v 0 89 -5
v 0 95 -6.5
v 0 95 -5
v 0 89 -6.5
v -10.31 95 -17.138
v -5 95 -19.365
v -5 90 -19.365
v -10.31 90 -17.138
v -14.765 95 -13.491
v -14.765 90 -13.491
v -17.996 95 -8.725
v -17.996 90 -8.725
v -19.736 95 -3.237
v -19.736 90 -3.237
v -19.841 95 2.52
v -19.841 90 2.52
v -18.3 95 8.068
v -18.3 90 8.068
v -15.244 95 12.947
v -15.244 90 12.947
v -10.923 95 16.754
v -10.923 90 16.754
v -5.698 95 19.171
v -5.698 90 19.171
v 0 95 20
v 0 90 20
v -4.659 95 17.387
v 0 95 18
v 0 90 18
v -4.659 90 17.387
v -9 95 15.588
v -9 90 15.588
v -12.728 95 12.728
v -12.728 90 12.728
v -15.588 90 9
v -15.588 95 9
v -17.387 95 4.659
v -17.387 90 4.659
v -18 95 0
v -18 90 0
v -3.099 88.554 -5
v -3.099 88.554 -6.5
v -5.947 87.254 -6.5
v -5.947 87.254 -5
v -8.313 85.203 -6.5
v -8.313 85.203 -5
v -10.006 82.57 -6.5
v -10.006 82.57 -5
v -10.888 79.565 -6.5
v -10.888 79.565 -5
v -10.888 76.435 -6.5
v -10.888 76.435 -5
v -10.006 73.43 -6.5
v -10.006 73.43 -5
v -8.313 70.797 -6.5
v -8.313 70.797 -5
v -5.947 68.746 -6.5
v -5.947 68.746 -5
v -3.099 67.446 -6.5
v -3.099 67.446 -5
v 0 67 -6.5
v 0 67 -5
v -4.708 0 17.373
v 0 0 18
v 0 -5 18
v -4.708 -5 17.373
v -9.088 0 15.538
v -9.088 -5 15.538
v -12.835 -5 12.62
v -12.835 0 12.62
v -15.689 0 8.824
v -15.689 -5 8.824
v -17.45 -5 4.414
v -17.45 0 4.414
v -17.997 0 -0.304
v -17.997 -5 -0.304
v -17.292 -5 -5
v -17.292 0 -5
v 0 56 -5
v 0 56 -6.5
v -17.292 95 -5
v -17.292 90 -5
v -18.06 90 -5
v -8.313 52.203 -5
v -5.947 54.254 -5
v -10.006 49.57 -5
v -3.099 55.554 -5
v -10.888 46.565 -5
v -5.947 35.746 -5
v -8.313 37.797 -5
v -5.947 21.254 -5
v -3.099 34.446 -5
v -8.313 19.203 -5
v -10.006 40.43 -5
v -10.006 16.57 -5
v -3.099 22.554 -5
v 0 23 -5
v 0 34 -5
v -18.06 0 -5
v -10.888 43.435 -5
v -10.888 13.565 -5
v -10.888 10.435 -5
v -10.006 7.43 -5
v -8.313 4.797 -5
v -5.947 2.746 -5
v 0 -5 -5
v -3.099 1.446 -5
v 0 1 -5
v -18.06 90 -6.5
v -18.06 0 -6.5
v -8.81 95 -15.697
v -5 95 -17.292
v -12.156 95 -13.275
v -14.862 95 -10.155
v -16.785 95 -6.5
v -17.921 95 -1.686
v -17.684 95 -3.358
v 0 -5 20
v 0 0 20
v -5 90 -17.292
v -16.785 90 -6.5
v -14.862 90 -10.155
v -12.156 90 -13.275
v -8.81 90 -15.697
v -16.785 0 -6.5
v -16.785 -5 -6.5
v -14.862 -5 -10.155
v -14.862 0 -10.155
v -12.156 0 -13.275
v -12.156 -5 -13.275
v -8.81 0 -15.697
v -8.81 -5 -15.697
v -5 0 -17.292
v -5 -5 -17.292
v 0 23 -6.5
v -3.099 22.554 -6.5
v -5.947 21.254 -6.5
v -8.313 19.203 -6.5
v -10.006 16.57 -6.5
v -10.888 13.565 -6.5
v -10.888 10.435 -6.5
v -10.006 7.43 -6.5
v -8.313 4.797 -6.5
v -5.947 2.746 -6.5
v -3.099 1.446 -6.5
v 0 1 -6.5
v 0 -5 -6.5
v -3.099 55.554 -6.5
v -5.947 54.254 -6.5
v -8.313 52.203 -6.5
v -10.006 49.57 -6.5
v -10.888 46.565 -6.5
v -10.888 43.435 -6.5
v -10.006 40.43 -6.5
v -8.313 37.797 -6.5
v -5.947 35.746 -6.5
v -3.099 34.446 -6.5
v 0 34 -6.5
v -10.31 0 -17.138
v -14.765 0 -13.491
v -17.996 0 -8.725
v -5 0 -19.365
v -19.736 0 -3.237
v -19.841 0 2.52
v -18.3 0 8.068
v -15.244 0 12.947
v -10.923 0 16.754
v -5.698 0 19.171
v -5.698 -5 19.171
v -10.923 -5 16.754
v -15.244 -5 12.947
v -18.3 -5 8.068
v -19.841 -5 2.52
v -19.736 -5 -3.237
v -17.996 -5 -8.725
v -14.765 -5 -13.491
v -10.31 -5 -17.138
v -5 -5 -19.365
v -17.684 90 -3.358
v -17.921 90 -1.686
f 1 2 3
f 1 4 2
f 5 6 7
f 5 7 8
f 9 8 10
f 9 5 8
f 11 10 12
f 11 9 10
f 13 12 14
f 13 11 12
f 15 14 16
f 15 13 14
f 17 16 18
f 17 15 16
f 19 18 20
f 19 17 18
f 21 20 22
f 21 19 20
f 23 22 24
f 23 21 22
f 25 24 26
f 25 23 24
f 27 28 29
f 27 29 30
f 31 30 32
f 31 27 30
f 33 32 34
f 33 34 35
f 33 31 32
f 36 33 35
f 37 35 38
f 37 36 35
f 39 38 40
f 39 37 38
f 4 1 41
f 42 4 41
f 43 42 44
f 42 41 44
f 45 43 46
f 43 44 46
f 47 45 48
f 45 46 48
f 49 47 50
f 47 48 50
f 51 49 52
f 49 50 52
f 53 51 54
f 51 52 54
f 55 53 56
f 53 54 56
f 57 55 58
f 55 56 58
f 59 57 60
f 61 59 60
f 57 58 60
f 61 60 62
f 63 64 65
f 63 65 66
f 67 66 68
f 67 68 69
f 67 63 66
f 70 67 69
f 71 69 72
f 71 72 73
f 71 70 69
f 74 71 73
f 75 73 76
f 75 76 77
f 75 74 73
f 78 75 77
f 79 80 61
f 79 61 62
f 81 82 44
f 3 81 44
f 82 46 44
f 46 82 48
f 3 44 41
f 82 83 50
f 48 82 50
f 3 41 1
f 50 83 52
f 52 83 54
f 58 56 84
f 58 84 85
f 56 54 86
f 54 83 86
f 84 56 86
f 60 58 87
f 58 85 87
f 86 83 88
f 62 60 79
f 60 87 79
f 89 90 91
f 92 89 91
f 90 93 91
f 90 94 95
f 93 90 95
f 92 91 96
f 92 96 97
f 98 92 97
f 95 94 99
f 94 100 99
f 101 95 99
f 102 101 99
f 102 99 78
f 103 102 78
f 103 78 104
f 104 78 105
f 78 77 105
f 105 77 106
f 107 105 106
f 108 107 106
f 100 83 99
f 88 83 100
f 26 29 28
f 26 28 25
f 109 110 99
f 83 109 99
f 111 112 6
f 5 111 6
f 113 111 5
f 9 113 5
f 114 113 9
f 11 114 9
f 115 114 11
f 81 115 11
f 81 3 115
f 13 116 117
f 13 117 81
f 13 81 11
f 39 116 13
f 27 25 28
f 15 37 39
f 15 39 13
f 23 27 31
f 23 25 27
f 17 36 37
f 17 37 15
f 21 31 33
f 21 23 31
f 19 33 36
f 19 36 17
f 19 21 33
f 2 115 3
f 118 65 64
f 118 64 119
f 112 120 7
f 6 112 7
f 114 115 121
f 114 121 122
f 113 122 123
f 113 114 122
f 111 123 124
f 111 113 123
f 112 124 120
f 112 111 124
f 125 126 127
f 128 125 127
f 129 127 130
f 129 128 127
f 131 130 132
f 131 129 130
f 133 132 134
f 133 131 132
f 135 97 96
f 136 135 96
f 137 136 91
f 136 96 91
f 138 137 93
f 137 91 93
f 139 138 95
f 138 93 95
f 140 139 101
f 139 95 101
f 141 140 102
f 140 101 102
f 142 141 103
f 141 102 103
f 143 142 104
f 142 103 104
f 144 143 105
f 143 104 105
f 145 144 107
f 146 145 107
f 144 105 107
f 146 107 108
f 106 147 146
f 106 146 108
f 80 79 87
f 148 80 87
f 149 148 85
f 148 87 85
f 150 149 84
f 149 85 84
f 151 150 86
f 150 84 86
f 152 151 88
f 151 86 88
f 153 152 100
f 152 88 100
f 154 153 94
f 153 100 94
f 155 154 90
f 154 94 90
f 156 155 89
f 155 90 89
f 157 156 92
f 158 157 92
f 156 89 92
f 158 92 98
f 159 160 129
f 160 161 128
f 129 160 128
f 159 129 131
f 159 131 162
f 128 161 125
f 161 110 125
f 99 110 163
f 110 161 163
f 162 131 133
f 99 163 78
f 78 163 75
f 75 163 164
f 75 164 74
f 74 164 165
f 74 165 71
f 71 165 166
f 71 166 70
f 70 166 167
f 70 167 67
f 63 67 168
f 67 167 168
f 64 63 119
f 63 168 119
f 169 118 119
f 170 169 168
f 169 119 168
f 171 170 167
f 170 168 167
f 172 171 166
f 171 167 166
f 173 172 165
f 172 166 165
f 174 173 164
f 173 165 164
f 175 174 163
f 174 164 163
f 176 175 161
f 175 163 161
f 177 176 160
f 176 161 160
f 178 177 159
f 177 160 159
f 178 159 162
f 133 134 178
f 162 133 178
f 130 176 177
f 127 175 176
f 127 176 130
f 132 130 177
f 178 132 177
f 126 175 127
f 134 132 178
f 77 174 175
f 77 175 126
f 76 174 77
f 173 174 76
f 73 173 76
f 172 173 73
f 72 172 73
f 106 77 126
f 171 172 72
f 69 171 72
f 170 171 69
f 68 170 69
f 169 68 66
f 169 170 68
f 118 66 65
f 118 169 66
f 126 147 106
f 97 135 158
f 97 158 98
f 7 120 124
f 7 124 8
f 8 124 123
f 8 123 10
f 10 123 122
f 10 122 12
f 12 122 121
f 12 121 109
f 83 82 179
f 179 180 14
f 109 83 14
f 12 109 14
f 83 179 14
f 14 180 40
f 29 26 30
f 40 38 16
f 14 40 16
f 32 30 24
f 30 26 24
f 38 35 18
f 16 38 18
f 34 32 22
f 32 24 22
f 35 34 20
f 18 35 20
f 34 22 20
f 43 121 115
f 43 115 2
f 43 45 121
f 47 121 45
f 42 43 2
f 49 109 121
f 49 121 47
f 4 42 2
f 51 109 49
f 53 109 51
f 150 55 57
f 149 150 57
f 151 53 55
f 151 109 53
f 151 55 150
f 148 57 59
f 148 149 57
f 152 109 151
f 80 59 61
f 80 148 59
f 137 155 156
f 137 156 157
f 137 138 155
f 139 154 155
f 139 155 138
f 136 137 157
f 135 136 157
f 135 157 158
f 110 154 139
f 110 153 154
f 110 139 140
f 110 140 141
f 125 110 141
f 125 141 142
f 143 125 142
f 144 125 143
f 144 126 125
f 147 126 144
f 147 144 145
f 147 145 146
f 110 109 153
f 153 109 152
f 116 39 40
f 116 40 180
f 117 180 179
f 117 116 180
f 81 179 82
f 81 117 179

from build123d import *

# Parameters (mm, degrees)
F0_R          = 20
F0_R_2        = 18
F1_DEPTH      = 5
F2_W          = 36
F2_H          = 1.5
F3_DEPTH      = 5
F3_DEPTH_BACK = 95
F4_R          = 20
F5_DEPTH      = 5
F7_DEPTH      = 100.001
F8_R          = 11
F9_DEPTH      = 14.365916731
F10_W         = 25.2537801862
F10_H         = 64.4325390458
F11_DEPTH     = 100


with BuildPart() as f1:
    # F0 (on Front) → F1 (new body)
    with BuildSketch(Plane.XZ):
        Circle(F0_R)
        Circle(F0_R_2, mode=Mode.SUBTRACT)
    extrude(amount=F1_DEPTH)

    # F2 (on Front) → F3 (join, two sides)
    with BuildSketch(Plane.XZ) as f3_sk:
        with Locations((-0.0596572459, -5.75)):
            Rectangle(F2_W, F2_H)
    extrude(amount=F3_DEPTH)
    extrude(f3_sk.sketch, amount=-F3_DEPTH_BACK)

    # F4 (on face) → F5 (join)
    with BuildSketch(Plane(origin=(0, 95, 0), x_dir=(-1, 0, 0), z_dir=(0, 1, 0))):
        Circle(F4_R)
        with BuildLine():
            ThreePointArc((-17.2916164658, -5), (-2.5249657043, 17.8220242451), (18, 0))
            ThreePointArc((18, 0), (17.8220242451, -2.5249657043), (17.2916164658, -5))
            Line((17.2916164658, -5), (18.0596572459, -5))
            Line((18.0596572459, -5), (18.0596572459, -6.5))
            Line((18.0596572459, -6.5), (16.7854103316, -6.5))
            ThreePointArc((16.7854103316, -6.5), (0, -18), (-16.7854103316, -6.5))
            Line((-16.7854103316, -6.5), (-17.9403427541, -6.5))
            Line((-17.9403427541, -6.5), (-17.9403427541, -5))
            Line((-17.9403427541, -5), (-17.2916164658, -5))
        make_face(mode=Mode.SUBTRACT)
    extrude(amount=-F5_DEPTH)

    # F6 (on face) → F7 (cut, through all)
    with BuildSketch(Plane.XZ.offset(5)):
        with BuildLine():
            ThreePointArc((5, -19.364916731), (0, -20), (-5, -19.364916731))
            Line((-5, -19.364916731), (-5, -22.519255057))
            Line((-5, -22.519255057), (5, -22.519255057))
            Line((5, -22.519255057), (5, -19.364916731))
        make_face()
        with BuildLine():
            ThreePointArc((5, -17.2916164658), (0, -18), (-5, -17.2916164658))
            Line((-5, -17.2916164658), (-5, -19.364916731))
            ThreePointArc((-5, -19.364916731), (0, -20), (5, -19.364916731))
            Line((5, -19.364916731), (5, -17.2916164658))
        make_face()
        with BuildLine():
            Line((5, -12.519255057), (-5, -12.519255057))
            Line((-5, -12.519255057), (-5, -17.2916164658))
            ThreePointArc((-5, -17.2916164658), (0, -18), (5, -17.2916164658))
            Line((5, -17.2916164658), (5, -12.519255057))
        make_face()
    extrude(amount=-F7_DEPTH, mode=Mode.SUBTRACT)

    # F8 (on face) → F9 (cut, through all)
    with BuildSketch(Plane.XY.offset(-5)):
        with Locations((0, 12)):
            Circle(F8_R)
        with Locations((0, 45)):
            Circle(F8_R)
        with Locations((0, 78)):
            Circle(F8_R)
    extrude(amount=-F9_DEPTH, mode=Mode.SUBTRACT)

    # F10 (on Front) → F11 (cut, symmetric)
    with BuildSketch(Plane.XZ):
        with Locations((12.6268900931, -0.3540255129)):
            Rectangle(F10_W, F10_H)
    extrude(amount=F11_DEPTH, both=True, mode=Mode.SUBTRACT)


solid = f1.part
